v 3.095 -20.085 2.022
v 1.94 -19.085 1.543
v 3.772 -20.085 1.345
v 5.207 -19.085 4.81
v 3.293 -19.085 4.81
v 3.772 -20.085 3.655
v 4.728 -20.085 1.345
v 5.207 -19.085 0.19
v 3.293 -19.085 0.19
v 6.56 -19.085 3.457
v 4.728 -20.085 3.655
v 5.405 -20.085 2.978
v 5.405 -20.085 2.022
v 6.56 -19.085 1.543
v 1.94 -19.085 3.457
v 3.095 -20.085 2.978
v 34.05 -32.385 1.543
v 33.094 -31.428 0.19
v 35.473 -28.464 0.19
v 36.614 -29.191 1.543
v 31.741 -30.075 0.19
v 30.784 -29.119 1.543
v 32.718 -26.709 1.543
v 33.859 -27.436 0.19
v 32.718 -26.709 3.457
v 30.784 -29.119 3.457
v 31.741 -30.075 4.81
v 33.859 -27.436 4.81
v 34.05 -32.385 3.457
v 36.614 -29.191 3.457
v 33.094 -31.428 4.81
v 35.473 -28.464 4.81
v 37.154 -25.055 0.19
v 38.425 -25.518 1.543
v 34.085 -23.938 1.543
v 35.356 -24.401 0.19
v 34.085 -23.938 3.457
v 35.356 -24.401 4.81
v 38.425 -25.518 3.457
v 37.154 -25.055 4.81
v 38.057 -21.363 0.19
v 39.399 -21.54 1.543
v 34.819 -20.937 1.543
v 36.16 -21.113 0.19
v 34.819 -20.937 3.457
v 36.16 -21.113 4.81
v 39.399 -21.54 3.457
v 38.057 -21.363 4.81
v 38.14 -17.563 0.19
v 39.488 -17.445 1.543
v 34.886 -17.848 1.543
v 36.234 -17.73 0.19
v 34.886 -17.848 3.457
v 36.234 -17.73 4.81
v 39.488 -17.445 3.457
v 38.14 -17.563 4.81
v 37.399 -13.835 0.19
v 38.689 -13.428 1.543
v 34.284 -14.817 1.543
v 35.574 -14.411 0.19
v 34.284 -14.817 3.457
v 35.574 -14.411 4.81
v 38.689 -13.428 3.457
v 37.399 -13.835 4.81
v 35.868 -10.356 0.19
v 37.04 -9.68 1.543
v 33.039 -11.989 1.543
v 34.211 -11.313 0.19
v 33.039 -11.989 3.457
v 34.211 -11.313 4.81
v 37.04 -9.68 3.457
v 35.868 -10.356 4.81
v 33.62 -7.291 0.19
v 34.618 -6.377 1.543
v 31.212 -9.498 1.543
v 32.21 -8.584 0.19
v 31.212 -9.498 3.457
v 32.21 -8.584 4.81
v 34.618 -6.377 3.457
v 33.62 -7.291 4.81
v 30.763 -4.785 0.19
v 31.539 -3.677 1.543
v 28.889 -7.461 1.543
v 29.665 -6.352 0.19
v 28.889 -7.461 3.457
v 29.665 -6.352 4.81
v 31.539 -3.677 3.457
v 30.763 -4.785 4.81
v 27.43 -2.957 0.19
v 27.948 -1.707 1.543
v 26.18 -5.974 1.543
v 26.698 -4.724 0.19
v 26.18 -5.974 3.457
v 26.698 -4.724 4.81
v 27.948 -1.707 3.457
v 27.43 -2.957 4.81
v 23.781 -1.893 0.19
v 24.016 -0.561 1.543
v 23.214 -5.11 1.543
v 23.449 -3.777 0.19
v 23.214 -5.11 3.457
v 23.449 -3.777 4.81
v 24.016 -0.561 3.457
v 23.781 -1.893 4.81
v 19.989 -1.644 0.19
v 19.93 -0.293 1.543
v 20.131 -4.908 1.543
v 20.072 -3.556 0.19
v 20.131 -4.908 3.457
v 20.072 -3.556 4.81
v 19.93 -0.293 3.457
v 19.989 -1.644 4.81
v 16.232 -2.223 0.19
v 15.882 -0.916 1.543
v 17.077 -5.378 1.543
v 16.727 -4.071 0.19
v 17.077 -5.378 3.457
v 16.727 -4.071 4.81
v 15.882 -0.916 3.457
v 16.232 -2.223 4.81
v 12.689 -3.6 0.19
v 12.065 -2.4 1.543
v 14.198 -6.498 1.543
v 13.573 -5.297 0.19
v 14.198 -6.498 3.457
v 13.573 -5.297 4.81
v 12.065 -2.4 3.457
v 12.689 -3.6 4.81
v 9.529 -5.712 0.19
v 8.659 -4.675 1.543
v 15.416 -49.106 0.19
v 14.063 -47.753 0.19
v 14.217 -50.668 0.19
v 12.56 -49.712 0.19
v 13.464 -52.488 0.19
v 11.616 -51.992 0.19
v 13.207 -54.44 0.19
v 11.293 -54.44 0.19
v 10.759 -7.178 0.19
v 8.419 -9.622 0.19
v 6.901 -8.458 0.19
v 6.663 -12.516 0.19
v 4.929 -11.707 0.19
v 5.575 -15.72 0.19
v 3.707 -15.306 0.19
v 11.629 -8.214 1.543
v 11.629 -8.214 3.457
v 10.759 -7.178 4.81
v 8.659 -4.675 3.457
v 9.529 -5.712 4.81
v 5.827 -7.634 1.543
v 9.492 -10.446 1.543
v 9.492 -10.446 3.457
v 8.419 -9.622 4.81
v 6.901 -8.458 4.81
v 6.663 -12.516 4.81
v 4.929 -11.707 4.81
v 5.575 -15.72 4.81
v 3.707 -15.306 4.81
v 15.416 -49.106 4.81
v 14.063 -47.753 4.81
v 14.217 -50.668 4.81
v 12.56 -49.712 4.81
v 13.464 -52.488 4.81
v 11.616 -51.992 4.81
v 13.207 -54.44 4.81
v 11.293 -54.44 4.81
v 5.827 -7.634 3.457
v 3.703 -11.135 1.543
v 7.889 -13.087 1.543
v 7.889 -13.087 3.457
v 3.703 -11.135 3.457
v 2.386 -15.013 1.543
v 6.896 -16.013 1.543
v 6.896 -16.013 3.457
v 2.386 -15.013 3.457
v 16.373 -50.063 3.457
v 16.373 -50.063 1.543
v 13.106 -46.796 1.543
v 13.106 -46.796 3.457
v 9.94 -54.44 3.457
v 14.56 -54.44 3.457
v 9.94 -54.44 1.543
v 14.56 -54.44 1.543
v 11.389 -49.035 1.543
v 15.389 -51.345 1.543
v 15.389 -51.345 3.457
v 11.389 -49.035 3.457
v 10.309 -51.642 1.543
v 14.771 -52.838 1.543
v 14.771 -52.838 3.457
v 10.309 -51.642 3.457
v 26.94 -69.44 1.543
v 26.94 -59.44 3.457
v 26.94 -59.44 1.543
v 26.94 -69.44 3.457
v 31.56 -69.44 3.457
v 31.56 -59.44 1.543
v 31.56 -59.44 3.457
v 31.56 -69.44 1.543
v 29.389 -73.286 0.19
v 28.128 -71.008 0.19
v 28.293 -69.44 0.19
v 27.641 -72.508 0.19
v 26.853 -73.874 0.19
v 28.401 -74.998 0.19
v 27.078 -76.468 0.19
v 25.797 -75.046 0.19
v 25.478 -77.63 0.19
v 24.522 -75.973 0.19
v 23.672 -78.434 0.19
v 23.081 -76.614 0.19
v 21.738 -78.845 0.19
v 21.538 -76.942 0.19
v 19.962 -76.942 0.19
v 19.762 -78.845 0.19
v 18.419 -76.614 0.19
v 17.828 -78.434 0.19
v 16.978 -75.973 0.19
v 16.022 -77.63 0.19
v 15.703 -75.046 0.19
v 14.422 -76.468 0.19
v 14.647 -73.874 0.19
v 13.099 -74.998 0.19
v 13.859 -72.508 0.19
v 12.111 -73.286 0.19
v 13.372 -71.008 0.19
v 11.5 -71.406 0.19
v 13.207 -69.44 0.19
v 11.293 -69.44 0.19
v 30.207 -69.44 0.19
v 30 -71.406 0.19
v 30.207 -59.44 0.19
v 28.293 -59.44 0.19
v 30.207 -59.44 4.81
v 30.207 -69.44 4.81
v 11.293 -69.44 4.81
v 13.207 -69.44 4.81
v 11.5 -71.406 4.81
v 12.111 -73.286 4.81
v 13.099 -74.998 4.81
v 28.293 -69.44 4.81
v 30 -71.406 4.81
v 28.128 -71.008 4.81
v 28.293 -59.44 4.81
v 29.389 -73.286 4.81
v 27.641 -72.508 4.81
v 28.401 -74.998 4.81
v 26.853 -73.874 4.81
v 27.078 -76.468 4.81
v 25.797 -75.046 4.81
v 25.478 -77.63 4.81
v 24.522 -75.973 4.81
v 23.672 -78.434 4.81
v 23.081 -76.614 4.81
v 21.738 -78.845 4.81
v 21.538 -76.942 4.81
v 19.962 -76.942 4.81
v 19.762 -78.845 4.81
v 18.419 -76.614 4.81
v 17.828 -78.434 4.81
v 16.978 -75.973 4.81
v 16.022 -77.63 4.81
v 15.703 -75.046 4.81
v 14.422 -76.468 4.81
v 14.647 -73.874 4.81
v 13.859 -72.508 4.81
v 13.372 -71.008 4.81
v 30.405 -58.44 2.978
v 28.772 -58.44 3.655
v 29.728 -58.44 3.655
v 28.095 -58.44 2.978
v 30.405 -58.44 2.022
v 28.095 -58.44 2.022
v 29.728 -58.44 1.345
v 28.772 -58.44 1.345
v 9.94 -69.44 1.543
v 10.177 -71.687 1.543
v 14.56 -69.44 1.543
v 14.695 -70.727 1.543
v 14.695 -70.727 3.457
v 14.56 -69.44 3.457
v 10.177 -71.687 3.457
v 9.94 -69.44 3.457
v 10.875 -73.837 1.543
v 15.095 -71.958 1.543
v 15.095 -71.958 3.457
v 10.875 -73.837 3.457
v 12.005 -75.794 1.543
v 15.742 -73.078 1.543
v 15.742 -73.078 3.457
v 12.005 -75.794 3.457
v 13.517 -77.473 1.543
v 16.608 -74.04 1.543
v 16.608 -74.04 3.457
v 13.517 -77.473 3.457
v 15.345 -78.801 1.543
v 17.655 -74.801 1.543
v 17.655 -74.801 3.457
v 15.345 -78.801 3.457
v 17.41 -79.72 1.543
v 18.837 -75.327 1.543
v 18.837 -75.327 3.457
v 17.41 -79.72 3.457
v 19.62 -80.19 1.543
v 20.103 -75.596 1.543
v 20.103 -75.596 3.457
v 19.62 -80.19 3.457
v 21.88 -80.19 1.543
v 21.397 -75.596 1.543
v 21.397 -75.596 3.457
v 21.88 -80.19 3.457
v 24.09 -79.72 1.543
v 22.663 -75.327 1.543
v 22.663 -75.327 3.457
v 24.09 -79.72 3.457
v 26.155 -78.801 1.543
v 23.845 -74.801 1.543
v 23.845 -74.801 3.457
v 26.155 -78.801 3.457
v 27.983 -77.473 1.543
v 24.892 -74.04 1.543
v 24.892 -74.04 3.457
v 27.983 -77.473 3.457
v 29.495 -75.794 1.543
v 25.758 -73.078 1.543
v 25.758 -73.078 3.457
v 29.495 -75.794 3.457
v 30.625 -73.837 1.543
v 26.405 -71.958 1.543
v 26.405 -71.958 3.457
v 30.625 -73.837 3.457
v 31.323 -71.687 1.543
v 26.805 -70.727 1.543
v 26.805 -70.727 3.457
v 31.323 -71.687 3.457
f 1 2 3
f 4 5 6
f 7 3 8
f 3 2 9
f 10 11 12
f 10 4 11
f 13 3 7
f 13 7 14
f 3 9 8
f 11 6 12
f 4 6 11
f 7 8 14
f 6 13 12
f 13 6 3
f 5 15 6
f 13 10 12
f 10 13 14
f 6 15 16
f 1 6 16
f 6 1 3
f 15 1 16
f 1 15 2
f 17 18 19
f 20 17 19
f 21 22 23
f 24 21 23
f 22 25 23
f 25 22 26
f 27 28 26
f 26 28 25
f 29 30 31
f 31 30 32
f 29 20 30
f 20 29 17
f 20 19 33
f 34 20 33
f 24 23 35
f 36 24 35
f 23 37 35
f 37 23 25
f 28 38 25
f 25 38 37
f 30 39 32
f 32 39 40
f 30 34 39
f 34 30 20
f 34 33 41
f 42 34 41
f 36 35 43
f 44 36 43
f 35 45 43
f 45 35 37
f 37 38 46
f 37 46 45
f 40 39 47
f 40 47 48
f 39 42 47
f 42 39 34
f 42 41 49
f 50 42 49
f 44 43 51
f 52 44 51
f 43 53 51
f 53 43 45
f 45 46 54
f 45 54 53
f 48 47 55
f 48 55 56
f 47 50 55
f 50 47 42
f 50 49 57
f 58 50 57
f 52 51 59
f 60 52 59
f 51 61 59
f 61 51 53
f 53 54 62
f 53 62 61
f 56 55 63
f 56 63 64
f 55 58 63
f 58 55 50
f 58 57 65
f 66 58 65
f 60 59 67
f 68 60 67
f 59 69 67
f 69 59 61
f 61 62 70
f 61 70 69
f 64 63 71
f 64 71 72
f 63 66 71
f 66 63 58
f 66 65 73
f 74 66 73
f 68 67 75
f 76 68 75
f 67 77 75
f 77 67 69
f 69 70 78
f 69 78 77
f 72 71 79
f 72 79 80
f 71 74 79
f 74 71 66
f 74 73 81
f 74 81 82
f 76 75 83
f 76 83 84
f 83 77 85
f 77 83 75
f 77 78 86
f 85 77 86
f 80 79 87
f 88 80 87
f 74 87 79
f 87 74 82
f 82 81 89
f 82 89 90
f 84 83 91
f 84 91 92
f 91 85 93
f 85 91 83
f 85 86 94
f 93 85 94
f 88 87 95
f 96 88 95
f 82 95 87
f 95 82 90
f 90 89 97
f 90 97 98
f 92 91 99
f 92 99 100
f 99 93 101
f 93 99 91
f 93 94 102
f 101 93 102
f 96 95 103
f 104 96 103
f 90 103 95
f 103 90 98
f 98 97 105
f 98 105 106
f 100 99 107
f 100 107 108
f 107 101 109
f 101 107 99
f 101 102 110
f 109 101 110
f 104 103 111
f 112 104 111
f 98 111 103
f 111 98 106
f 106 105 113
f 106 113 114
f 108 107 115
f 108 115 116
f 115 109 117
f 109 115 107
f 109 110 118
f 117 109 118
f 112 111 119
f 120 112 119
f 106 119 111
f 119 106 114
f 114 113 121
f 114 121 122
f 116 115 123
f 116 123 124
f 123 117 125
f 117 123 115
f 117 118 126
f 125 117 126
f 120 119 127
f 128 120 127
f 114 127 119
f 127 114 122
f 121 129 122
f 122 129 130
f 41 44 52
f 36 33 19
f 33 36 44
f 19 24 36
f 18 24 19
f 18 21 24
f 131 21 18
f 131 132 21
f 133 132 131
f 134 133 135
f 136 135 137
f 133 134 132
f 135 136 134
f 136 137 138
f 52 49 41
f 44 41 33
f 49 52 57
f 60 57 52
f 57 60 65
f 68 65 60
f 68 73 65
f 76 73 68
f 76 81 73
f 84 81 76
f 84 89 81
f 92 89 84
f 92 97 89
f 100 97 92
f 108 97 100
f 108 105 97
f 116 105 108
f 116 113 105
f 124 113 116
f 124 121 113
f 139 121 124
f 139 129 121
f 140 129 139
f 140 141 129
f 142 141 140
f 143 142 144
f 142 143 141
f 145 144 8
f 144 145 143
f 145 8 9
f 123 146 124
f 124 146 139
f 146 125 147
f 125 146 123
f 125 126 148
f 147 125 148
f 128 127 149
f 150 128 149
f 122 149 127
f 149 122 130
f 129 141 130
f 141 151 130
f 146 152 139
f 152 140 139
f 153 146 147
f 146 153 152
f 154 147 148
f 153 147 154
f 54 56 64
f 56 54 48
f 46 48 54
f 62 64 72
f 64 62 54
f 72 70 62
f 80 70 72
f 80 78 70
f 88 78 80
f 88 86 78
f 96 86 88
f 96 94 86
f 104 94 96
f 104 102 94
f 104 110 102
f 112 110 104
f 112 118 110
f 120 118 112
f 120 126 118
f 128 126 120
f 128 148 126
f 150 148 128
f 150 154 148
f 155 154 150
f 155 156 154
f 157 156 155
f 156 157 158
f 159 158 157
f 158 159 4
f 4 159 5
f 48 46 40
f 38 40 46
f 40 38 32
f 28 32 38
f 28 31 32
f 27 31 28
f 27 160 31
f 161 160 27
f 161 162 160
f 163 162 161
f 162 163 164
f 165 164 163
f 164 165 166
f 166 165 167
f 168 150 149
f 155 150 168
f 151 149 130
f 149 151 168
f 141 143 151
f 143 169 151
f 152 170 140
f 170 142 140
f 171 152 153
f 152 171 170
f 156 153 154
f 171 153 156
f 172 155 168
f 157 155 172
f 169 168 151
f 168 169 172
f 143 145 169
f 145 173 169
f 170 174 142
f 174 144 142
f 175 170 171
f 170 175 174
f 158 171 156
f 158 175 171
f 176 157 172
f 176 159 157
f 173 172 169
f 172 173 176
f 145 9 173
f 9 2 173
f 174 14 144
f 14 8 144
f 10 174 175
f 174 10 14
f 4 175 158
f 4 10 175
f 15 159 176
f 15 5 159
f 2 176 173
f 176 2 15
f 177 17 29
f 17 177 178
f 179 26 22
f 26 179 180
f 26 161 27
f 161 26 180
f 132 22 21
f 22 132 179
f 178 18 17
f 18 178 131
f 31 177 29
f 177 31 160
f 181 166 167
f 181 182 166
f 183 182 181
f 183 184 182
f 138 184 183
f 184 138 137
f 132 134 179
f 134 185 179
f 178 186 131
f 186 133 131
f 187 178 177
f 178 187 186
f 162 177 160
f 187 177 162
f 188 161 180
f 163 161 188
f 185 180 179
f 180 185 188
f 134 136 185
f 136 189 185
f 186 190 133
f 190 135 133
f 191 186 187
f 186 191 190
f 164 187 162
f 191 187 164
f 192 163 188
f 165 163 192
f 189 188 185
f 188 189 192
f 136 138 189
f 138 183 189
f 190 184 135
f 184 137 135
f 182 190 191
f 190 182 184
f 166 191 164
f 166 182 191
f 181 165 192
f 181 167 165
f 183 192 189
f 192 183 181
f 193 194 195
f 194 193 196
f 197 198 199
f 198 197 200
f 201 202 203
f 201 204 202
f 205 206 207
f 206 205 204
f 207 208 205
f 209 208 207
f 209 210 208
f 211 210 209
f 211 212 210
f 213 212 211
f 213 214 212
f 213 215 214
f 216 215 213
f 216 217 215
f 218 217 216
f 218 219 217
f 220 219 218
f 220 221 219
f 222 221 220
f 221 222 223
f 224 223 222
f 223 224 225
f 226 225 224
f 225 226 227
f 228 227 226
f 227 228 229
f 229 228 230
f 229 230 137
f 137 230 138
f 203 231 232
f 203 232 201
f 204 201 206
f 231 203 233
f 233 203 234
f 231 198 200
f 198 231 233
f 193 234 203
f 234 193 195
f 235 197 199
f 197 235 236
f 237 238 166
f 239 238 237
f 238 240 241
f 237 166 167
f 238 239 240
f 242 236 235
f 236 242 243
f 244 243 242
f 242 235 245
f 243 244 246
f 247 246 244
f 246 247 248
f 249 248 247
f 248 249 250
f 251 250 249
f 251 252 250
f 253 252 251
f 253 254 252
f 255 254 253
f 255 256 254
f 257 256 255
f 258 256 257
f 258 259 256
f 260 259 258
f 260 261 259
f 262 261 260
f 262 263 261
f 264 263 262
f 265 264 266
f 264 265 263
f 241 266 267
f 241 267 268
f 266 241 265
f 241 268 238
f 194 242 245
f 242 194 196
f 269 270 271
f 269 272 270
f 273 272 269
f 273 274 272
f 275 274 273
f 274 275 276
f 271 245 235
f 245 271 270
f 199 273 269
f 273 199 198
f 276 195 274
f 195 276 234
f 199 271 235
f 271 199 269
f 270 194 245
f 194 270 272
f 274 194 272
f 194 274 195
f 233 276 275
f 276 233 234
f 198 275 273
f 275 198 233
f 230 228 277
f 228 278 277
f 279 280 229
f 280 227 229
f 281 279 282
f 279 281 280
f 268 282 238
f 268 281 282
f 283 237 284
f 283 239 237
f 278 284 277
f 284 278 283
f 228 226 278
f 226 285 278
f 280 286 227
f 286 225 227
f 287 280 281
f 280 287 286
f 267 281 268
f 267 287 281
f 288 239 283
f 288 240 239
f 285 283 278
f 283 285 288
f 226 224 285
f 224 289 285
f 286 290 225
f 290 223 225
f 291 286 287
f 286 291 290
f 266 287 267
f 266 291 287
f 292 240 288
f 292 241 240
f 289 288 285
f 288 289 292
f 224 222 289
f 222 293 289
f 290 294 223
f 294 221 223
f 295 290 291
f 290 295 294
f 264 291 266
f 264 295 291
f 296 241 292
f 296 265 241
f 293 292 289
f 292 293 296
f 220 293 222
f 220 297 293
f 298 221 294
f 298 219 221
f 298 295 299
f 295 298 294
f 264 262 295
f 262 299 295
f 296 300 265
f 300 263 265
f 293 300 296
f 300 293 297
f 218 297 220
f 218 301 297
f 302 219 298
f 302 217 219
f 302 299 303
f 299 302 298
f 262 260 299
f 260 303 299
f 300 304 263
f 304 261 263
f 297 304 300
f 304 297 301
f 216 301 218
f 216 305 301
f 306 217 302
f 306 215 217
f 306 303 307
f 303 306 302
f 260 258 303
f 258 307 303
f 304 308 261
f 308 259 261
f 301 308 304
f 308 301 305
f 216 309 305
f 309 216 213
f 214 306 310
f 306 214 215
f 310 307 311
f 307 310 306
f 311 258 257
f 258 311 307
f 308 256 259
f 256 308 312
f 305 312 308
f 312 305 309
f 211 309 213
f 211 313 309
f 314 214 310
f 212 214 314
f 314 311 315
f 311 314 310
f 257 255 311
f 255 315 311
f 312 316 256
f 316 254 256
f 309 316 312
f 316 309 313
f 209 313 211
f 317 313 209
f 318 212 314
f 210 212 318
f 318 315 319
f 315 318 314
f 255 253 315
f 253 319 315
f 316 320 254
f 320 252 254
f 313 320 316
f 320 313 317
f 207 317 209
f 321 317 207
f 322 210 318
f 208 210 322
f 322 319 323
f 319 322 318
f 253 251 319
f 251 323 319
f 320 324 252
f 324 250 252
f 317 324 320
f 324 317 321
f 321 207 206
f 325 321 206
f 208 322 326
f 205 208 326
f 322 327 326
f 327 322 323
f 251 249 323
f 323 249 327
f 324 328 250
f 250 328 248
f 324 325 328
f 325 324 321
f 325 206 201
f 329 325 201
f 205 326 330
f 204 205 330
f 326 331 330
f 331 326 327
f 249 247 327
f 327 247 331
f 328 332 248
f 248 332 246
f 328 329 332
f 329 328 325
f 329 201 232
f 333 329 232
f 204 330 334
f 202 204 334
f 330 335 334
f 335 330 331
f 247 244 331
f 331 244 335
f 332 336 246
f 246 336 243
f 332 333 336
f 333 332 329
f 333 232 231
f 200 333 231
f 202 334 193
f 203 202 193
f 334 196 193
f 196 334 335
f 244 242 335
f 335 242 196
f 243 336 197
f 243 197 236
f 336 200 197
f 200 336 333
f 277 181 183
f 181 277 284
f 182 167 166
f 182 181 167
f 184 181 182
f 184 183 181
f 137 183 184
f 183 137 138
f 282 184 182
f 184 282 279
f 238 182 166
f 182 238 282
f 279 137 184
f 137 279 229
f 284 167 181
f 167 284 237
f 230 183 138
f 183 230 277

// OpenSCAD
// Diameter of the "wire" you want to use for hook.
wire_width = 5;

// "Runded" end of wire length, use 0 for straight.
wire_cap_length = 1;

// Diameter of top hook. Note that this specifies diameter of pipe this hook should fit. Real diameter will be extended by wire width.
top_hook_inner_diameter = 28;

// Diameter of bottom hook. Note that this specifies diameter of pipe this hook should fit. Real diameter will be extended by wire width.
bottom_hook_inner_diameter= 12;

// Length of straight extension of bottom hook.
bottom_hook_length=15;


module simple_hook(w, d1, d2, l2, cl=1) {
    wire_radius = w/2;
    top_hook_radius = d1/2 + wire_radius;
    bottom_hook_radius = d2/2 + wire_radius;
    center_length = top_hook_radius + bottom_hook_radius;

    module wire_face() {
        rotate([0, 0, 22.5]) 
         circle(wire_radius, $fn=8);
    }

    module curved_wire(rad, angle) {
       rotate_extrude(angle=angle) 
        translate([rad, 0, 0]) 
        wire_face(); 
    }

    module straight_wire(length) {
        rotate([90, 0, 0]) 
         linear_extrude(length) 
         wire_face();
    }

    module wire_cap() {
        rotate([90, 0, 0]) 
         rotate([0, 0, 22.5]) 
         cylinder(h=cl, r1=wire_radius, r2=wire_radius/2, $fn=8);
    }

    module top_hook() {
        rotate([0, 0, 45])
         translate([-top_hook_radius, 0, 0])
         wire_cap();
        
        curved_wire(top_hook_radius, 225);
        
        translate([top_hook_radius, 0, 0])
         straight_wire(center_length);

        translate([center_length, -center_length, 0])
         rotate([0, 0, 180])
         curved_wire(bottom_hook_radius, 45);
    }

    module bottom_hook() {
        curved_wire(bottom_hook_radius, 180);
        
        translate([-bottom_hook_radius, 0, 0]) {
            straight_wire(l2*2/3);
            translate([0, -l2*2/3, 0]) wire_cap();
        }
        
        translate([bottom_hook_radius, 0, 0]) straight_wire(l2);
    }

    translate([top_hook_radius, 0 , 0]) 
     rotate([0, 0, -45])
     translate([2*top_hook_radius, -(top_hook_radius+center_length), wire_radius]) {
        translate([-top_hook_radius, center_length + sin(45)*bottom_hook_radius, 0])
         top_hook();

        translate([bottom_hook_radius - cos(45)*bottom_hook_radius, 0, 0])
         rotate([0, 0, 225])
         translate([-bottom_hook_radius, l2, 0])
         bottom_hook();
    }
}


simple_hook(wire_width, top_hook_inner_diameter, bottom_hook_inner_diameter, bottom_hook_length, wire_cap_length);
